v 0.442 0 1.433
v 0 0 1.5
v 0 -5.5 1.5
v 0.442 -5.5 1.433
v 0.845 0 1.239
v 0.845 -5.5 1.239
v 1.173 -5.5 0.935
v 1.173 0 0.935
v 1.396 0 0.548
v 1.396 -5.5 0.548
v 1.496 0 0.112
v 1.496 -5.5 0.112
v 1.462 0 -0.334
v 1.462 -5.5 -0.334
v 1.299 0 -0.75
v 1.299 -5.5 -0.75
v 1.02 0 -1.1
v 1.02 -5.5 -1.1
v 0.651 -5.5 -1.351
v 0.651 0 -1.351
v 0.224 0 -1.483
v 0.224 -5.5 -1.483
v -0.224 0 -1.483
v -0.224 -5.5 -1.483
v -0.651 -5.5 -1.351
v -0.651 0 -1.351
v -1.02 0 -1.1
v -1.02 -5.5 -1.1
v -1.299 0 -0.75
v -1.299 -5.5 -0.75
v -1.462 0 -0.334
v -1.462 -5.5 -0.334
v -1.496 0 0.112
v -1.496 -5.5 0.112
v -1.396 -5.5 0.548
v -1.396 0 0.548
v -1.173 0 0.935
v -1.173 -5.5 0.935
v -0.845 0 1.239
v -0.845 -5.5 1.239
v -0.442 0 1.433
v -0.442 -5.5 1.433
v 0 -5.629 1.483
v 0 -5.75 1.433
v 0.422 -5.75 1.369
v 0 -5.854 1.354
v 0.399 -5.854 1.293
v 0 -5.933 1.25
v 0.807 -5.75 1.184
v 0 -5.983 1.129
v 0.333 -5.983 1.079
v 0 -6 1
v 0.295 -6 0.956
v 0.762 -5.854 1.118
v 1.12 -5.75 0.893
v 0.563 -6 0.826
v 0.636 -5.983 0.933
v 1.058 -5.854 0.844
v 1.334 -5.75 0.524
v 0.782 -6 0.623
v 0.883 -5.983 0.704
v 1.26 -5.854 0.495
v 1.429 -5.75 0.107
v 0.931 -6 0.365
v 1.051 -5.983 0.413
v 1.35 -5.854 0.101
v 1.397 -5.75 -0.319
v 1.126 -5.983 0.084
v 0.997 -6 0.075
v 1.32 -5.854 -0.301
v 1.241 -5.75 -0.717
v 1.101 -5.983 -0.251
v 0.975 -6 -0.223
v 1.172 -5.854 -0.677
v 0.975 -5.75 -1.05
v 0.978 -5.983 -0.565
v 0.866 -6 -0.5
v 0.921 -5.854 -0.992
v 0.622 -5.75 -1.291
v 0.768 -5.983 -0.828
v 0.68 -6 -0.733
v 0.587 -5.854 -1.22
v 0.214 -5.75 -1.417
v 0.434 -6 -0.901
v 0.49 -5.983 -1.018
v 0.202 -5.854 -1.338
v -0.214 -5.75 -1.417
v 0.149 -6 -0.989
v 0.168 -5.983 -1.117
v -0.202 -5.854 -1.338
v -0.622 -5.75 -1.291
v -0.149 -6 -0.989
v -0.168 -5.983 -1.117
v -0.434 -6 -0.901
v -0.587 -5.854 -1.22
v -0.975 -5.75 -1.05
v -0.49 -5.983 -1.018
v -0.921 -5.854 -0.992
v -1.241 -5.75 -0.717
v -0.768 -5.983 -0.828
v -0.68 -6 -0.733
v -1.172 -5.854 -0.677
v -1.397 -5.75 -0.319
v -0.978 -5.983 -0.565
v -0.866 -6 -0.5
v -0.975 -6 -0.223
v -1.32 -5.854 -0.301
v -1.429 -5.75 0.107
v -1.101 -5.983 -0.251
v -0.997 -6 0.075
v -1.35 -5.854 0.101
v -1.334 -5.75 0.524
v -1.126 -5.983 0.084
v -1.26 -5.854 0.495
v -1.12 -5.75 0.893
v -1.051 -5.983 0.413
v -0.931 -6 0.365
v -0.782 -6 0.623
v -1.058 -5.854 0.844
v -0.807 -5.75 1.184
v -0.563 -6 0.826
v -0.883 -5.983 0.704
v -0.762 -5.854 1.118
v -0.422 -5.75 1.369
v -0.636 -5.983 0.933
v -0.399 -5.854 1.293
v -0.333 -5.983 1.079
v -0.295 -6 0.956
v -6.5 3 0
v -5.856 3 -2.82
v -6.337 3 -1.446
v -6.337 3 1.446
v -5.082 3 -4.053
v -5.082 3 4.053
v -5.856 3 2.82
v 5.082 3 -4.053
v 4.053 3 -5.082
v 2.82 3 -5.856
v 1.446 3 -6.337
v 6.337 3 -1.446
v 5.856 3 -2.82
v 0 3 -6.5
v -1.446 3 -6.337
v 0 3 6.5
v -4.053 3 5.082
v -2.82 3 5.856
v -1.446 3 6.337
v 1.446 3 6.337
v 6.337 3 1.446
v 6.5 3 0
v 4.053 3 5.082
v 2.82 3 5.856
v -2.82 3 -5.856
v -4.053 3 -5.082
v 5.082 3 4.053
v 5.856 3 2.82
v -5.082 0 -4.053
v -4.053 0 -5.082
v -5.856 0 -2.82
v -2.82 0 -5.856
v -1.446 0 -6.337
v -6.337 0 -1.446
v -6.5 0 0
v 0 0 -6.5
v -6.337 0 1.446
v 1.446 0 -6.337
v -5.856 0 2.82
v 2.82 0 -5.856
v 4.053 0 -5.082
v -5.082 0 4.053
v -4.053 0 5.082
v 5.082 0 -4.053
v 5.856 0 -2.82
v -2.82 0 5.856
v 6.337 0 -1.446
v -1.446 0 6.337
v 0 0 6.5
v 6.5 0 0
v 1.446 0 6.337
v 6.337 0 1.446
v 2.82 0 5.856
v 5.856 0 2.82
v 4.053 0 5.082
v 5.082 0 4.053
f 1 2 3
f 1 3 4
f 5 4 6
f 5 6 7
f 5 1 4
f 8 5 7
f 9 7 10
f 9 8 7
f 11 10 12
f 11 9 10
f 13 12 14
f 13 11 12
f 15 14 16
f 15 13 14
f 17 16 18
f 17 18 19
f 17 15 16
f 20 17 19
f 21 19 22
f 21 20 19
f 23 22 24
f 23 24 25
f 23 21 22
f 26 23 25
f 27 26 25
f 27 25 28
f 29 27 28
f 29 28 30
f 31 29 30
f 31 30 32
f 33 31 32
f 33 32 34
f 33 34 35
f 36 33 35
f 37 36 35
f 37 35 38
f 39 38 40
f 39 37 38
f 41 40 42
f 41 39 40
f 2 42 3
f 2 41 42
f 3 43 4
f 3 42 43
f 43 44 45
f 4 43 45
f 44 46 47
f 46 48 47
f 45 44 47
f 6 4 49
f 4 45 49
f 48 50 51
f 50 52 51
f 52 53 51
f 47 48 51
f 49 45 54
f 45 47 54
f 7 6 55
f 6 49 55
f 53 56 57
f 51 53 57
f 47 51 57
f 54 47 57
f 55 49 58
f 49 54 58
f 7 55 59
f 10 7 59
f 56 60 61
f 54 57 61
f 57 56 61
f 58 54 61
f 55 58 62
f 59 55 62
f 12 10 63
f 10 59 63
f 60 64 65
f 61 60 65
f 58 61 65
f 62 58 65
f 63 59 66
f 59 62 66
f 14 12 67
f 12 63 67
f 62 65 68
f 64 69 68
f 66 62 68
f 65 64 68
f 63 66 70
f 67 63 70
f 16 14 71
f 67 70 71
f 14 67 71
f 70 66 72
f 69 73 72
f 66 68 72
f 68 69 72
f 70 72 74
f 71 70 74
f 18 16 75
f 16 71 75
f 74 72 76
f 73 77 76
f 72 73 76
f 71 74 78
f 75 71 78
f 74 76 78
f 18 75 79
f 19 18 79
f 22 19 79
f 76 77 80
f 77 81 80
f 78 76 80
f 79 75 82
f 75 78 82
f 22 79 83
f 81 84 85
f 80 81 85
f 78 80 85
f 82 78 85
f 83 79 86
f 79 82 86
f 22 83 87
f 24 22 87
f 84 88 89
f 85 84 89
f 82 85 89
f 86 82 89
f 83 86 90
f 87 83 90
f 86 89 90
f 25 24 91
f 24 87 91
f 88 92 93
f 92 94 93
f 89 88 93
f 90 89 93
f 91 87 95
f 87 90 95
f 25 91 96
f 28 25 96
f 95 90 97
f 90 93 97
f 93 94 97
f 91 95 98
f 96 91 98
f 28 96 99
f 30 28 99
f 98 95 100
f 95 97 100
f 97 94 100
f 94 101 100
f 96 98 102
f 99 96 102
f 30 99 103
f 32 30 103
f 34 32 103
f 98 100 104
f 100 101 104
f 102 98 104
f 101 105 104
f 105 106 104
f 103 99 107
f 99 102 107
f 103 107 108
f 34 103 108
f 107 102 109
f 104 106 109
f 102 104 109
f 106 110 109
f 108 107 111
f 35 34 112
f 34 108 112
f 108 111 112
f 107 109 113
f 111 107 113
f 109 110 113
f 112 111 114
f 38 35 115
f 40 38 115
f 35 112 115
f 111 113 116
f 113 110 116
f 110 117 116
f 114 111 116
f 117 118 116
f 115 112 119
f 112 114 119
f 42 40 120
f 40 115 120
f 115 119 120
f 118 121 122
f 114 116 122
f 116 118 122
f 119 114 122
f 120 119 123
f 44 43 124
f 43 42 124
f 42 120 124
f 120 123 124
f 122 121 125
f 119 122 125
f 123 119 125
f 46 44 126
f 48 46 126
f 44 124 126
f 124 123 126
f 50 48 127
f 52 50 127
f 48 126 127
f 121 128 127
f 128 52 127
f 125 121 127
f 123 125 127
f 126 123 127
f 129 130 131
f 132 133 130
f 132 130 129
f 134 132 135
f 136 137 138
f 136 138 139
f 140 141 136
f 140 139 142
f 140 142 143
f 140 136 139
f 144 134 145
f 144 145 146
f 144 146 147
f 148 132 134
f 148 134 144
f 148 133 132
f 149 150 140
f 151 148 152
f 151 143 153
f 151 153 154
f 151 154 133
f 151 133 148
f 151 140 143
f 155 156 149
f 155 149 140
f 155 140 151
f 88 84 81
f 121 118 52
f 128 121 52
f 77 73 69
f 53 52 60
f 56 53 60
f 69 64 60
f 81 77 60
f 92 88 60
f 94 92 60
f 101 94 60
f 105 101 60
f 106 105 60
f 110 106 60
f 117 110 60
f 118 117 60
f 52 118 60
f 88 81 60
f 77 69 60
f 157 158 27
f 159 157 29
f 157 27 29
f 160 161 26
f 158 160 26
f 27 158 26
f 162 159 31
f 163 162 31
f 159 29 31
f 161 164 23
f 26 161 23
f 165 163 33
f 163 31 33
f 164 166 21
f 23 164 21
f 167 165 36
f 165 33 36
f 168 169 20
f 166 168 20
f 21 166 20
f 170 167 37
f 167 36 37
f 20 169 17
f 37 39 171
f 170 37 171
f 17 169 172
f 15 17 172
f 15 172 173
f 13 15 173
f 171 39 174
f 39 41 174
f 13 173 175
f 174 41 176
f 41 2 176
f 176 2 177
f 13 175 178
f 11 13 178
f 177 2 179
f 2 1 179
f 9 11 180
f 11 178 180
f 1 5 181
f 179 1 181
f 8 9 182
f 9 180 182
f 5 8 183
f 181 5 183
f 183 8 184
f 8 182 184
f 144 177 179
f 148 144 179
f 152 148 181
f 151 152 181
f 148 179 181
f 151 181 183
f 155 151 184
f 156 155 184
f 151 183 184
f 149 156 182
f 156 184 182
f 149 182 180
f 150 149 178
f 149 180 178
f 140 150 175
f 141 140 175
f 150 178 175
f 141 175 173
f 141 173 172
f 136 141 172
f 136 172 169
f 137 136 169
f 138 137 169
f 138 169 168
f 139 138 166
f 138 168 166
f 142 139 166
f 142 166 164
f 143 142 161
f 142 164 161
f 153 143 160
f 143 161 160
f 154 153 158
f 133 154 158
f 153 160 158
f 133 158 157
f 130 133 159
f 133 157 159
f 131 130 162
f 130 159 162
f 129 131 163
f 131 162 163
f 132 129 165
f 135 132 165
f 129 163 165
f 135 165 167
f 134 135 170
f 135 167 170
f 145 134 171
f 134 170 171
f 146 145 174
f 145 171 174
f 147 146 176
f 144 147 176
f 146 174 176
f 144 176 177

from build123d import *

# Parameters (mm, degrees)
SKETCH1_R           = 6.5
BOSS_EXTRUDE1_DEPTH = 3
SKETCH2_R           = 1.5
BOSS_EXTRUDE2_DEPTH = 6
FILLET1_R           = 0.5


with BuildPart() as part:
    # Sketch1 → Boss-Extrude1 (new body)
    with BuildSketch(Plane(origin=(0, 0, 0), x_dir=(1, 0, 0), z_dir=(0, 1, 0))):
        with Locations(Location((0, 0, 0), (0, 0, 270))):
            Circle(SKETCH1_R)
    extrude(amount=BOSS_EXTRUDE1_DEPTH)

    # Sketch2 → Boss-Extrude2 (add)
    with BuildSketch(Plane(origin=(0, 0, 0), x_dir=(1, 0, 0), z_dir=(0, 1, 0))):
        with Locations(Location((0, 0, 0), (0, 0, 270))):
            Circle(SKETCH2_R)
    extrude(amount=-BOSS_EXTRUDE2_DEPTH)

    # Fillet1
    fillet1_edges = [part.edges().sort_by_distance(p)[0] for p in [
        (0, -6, -1.5),
    ]]
    fillet(fillet1_edges, radius=FILLET1_R)


solid = part.part
